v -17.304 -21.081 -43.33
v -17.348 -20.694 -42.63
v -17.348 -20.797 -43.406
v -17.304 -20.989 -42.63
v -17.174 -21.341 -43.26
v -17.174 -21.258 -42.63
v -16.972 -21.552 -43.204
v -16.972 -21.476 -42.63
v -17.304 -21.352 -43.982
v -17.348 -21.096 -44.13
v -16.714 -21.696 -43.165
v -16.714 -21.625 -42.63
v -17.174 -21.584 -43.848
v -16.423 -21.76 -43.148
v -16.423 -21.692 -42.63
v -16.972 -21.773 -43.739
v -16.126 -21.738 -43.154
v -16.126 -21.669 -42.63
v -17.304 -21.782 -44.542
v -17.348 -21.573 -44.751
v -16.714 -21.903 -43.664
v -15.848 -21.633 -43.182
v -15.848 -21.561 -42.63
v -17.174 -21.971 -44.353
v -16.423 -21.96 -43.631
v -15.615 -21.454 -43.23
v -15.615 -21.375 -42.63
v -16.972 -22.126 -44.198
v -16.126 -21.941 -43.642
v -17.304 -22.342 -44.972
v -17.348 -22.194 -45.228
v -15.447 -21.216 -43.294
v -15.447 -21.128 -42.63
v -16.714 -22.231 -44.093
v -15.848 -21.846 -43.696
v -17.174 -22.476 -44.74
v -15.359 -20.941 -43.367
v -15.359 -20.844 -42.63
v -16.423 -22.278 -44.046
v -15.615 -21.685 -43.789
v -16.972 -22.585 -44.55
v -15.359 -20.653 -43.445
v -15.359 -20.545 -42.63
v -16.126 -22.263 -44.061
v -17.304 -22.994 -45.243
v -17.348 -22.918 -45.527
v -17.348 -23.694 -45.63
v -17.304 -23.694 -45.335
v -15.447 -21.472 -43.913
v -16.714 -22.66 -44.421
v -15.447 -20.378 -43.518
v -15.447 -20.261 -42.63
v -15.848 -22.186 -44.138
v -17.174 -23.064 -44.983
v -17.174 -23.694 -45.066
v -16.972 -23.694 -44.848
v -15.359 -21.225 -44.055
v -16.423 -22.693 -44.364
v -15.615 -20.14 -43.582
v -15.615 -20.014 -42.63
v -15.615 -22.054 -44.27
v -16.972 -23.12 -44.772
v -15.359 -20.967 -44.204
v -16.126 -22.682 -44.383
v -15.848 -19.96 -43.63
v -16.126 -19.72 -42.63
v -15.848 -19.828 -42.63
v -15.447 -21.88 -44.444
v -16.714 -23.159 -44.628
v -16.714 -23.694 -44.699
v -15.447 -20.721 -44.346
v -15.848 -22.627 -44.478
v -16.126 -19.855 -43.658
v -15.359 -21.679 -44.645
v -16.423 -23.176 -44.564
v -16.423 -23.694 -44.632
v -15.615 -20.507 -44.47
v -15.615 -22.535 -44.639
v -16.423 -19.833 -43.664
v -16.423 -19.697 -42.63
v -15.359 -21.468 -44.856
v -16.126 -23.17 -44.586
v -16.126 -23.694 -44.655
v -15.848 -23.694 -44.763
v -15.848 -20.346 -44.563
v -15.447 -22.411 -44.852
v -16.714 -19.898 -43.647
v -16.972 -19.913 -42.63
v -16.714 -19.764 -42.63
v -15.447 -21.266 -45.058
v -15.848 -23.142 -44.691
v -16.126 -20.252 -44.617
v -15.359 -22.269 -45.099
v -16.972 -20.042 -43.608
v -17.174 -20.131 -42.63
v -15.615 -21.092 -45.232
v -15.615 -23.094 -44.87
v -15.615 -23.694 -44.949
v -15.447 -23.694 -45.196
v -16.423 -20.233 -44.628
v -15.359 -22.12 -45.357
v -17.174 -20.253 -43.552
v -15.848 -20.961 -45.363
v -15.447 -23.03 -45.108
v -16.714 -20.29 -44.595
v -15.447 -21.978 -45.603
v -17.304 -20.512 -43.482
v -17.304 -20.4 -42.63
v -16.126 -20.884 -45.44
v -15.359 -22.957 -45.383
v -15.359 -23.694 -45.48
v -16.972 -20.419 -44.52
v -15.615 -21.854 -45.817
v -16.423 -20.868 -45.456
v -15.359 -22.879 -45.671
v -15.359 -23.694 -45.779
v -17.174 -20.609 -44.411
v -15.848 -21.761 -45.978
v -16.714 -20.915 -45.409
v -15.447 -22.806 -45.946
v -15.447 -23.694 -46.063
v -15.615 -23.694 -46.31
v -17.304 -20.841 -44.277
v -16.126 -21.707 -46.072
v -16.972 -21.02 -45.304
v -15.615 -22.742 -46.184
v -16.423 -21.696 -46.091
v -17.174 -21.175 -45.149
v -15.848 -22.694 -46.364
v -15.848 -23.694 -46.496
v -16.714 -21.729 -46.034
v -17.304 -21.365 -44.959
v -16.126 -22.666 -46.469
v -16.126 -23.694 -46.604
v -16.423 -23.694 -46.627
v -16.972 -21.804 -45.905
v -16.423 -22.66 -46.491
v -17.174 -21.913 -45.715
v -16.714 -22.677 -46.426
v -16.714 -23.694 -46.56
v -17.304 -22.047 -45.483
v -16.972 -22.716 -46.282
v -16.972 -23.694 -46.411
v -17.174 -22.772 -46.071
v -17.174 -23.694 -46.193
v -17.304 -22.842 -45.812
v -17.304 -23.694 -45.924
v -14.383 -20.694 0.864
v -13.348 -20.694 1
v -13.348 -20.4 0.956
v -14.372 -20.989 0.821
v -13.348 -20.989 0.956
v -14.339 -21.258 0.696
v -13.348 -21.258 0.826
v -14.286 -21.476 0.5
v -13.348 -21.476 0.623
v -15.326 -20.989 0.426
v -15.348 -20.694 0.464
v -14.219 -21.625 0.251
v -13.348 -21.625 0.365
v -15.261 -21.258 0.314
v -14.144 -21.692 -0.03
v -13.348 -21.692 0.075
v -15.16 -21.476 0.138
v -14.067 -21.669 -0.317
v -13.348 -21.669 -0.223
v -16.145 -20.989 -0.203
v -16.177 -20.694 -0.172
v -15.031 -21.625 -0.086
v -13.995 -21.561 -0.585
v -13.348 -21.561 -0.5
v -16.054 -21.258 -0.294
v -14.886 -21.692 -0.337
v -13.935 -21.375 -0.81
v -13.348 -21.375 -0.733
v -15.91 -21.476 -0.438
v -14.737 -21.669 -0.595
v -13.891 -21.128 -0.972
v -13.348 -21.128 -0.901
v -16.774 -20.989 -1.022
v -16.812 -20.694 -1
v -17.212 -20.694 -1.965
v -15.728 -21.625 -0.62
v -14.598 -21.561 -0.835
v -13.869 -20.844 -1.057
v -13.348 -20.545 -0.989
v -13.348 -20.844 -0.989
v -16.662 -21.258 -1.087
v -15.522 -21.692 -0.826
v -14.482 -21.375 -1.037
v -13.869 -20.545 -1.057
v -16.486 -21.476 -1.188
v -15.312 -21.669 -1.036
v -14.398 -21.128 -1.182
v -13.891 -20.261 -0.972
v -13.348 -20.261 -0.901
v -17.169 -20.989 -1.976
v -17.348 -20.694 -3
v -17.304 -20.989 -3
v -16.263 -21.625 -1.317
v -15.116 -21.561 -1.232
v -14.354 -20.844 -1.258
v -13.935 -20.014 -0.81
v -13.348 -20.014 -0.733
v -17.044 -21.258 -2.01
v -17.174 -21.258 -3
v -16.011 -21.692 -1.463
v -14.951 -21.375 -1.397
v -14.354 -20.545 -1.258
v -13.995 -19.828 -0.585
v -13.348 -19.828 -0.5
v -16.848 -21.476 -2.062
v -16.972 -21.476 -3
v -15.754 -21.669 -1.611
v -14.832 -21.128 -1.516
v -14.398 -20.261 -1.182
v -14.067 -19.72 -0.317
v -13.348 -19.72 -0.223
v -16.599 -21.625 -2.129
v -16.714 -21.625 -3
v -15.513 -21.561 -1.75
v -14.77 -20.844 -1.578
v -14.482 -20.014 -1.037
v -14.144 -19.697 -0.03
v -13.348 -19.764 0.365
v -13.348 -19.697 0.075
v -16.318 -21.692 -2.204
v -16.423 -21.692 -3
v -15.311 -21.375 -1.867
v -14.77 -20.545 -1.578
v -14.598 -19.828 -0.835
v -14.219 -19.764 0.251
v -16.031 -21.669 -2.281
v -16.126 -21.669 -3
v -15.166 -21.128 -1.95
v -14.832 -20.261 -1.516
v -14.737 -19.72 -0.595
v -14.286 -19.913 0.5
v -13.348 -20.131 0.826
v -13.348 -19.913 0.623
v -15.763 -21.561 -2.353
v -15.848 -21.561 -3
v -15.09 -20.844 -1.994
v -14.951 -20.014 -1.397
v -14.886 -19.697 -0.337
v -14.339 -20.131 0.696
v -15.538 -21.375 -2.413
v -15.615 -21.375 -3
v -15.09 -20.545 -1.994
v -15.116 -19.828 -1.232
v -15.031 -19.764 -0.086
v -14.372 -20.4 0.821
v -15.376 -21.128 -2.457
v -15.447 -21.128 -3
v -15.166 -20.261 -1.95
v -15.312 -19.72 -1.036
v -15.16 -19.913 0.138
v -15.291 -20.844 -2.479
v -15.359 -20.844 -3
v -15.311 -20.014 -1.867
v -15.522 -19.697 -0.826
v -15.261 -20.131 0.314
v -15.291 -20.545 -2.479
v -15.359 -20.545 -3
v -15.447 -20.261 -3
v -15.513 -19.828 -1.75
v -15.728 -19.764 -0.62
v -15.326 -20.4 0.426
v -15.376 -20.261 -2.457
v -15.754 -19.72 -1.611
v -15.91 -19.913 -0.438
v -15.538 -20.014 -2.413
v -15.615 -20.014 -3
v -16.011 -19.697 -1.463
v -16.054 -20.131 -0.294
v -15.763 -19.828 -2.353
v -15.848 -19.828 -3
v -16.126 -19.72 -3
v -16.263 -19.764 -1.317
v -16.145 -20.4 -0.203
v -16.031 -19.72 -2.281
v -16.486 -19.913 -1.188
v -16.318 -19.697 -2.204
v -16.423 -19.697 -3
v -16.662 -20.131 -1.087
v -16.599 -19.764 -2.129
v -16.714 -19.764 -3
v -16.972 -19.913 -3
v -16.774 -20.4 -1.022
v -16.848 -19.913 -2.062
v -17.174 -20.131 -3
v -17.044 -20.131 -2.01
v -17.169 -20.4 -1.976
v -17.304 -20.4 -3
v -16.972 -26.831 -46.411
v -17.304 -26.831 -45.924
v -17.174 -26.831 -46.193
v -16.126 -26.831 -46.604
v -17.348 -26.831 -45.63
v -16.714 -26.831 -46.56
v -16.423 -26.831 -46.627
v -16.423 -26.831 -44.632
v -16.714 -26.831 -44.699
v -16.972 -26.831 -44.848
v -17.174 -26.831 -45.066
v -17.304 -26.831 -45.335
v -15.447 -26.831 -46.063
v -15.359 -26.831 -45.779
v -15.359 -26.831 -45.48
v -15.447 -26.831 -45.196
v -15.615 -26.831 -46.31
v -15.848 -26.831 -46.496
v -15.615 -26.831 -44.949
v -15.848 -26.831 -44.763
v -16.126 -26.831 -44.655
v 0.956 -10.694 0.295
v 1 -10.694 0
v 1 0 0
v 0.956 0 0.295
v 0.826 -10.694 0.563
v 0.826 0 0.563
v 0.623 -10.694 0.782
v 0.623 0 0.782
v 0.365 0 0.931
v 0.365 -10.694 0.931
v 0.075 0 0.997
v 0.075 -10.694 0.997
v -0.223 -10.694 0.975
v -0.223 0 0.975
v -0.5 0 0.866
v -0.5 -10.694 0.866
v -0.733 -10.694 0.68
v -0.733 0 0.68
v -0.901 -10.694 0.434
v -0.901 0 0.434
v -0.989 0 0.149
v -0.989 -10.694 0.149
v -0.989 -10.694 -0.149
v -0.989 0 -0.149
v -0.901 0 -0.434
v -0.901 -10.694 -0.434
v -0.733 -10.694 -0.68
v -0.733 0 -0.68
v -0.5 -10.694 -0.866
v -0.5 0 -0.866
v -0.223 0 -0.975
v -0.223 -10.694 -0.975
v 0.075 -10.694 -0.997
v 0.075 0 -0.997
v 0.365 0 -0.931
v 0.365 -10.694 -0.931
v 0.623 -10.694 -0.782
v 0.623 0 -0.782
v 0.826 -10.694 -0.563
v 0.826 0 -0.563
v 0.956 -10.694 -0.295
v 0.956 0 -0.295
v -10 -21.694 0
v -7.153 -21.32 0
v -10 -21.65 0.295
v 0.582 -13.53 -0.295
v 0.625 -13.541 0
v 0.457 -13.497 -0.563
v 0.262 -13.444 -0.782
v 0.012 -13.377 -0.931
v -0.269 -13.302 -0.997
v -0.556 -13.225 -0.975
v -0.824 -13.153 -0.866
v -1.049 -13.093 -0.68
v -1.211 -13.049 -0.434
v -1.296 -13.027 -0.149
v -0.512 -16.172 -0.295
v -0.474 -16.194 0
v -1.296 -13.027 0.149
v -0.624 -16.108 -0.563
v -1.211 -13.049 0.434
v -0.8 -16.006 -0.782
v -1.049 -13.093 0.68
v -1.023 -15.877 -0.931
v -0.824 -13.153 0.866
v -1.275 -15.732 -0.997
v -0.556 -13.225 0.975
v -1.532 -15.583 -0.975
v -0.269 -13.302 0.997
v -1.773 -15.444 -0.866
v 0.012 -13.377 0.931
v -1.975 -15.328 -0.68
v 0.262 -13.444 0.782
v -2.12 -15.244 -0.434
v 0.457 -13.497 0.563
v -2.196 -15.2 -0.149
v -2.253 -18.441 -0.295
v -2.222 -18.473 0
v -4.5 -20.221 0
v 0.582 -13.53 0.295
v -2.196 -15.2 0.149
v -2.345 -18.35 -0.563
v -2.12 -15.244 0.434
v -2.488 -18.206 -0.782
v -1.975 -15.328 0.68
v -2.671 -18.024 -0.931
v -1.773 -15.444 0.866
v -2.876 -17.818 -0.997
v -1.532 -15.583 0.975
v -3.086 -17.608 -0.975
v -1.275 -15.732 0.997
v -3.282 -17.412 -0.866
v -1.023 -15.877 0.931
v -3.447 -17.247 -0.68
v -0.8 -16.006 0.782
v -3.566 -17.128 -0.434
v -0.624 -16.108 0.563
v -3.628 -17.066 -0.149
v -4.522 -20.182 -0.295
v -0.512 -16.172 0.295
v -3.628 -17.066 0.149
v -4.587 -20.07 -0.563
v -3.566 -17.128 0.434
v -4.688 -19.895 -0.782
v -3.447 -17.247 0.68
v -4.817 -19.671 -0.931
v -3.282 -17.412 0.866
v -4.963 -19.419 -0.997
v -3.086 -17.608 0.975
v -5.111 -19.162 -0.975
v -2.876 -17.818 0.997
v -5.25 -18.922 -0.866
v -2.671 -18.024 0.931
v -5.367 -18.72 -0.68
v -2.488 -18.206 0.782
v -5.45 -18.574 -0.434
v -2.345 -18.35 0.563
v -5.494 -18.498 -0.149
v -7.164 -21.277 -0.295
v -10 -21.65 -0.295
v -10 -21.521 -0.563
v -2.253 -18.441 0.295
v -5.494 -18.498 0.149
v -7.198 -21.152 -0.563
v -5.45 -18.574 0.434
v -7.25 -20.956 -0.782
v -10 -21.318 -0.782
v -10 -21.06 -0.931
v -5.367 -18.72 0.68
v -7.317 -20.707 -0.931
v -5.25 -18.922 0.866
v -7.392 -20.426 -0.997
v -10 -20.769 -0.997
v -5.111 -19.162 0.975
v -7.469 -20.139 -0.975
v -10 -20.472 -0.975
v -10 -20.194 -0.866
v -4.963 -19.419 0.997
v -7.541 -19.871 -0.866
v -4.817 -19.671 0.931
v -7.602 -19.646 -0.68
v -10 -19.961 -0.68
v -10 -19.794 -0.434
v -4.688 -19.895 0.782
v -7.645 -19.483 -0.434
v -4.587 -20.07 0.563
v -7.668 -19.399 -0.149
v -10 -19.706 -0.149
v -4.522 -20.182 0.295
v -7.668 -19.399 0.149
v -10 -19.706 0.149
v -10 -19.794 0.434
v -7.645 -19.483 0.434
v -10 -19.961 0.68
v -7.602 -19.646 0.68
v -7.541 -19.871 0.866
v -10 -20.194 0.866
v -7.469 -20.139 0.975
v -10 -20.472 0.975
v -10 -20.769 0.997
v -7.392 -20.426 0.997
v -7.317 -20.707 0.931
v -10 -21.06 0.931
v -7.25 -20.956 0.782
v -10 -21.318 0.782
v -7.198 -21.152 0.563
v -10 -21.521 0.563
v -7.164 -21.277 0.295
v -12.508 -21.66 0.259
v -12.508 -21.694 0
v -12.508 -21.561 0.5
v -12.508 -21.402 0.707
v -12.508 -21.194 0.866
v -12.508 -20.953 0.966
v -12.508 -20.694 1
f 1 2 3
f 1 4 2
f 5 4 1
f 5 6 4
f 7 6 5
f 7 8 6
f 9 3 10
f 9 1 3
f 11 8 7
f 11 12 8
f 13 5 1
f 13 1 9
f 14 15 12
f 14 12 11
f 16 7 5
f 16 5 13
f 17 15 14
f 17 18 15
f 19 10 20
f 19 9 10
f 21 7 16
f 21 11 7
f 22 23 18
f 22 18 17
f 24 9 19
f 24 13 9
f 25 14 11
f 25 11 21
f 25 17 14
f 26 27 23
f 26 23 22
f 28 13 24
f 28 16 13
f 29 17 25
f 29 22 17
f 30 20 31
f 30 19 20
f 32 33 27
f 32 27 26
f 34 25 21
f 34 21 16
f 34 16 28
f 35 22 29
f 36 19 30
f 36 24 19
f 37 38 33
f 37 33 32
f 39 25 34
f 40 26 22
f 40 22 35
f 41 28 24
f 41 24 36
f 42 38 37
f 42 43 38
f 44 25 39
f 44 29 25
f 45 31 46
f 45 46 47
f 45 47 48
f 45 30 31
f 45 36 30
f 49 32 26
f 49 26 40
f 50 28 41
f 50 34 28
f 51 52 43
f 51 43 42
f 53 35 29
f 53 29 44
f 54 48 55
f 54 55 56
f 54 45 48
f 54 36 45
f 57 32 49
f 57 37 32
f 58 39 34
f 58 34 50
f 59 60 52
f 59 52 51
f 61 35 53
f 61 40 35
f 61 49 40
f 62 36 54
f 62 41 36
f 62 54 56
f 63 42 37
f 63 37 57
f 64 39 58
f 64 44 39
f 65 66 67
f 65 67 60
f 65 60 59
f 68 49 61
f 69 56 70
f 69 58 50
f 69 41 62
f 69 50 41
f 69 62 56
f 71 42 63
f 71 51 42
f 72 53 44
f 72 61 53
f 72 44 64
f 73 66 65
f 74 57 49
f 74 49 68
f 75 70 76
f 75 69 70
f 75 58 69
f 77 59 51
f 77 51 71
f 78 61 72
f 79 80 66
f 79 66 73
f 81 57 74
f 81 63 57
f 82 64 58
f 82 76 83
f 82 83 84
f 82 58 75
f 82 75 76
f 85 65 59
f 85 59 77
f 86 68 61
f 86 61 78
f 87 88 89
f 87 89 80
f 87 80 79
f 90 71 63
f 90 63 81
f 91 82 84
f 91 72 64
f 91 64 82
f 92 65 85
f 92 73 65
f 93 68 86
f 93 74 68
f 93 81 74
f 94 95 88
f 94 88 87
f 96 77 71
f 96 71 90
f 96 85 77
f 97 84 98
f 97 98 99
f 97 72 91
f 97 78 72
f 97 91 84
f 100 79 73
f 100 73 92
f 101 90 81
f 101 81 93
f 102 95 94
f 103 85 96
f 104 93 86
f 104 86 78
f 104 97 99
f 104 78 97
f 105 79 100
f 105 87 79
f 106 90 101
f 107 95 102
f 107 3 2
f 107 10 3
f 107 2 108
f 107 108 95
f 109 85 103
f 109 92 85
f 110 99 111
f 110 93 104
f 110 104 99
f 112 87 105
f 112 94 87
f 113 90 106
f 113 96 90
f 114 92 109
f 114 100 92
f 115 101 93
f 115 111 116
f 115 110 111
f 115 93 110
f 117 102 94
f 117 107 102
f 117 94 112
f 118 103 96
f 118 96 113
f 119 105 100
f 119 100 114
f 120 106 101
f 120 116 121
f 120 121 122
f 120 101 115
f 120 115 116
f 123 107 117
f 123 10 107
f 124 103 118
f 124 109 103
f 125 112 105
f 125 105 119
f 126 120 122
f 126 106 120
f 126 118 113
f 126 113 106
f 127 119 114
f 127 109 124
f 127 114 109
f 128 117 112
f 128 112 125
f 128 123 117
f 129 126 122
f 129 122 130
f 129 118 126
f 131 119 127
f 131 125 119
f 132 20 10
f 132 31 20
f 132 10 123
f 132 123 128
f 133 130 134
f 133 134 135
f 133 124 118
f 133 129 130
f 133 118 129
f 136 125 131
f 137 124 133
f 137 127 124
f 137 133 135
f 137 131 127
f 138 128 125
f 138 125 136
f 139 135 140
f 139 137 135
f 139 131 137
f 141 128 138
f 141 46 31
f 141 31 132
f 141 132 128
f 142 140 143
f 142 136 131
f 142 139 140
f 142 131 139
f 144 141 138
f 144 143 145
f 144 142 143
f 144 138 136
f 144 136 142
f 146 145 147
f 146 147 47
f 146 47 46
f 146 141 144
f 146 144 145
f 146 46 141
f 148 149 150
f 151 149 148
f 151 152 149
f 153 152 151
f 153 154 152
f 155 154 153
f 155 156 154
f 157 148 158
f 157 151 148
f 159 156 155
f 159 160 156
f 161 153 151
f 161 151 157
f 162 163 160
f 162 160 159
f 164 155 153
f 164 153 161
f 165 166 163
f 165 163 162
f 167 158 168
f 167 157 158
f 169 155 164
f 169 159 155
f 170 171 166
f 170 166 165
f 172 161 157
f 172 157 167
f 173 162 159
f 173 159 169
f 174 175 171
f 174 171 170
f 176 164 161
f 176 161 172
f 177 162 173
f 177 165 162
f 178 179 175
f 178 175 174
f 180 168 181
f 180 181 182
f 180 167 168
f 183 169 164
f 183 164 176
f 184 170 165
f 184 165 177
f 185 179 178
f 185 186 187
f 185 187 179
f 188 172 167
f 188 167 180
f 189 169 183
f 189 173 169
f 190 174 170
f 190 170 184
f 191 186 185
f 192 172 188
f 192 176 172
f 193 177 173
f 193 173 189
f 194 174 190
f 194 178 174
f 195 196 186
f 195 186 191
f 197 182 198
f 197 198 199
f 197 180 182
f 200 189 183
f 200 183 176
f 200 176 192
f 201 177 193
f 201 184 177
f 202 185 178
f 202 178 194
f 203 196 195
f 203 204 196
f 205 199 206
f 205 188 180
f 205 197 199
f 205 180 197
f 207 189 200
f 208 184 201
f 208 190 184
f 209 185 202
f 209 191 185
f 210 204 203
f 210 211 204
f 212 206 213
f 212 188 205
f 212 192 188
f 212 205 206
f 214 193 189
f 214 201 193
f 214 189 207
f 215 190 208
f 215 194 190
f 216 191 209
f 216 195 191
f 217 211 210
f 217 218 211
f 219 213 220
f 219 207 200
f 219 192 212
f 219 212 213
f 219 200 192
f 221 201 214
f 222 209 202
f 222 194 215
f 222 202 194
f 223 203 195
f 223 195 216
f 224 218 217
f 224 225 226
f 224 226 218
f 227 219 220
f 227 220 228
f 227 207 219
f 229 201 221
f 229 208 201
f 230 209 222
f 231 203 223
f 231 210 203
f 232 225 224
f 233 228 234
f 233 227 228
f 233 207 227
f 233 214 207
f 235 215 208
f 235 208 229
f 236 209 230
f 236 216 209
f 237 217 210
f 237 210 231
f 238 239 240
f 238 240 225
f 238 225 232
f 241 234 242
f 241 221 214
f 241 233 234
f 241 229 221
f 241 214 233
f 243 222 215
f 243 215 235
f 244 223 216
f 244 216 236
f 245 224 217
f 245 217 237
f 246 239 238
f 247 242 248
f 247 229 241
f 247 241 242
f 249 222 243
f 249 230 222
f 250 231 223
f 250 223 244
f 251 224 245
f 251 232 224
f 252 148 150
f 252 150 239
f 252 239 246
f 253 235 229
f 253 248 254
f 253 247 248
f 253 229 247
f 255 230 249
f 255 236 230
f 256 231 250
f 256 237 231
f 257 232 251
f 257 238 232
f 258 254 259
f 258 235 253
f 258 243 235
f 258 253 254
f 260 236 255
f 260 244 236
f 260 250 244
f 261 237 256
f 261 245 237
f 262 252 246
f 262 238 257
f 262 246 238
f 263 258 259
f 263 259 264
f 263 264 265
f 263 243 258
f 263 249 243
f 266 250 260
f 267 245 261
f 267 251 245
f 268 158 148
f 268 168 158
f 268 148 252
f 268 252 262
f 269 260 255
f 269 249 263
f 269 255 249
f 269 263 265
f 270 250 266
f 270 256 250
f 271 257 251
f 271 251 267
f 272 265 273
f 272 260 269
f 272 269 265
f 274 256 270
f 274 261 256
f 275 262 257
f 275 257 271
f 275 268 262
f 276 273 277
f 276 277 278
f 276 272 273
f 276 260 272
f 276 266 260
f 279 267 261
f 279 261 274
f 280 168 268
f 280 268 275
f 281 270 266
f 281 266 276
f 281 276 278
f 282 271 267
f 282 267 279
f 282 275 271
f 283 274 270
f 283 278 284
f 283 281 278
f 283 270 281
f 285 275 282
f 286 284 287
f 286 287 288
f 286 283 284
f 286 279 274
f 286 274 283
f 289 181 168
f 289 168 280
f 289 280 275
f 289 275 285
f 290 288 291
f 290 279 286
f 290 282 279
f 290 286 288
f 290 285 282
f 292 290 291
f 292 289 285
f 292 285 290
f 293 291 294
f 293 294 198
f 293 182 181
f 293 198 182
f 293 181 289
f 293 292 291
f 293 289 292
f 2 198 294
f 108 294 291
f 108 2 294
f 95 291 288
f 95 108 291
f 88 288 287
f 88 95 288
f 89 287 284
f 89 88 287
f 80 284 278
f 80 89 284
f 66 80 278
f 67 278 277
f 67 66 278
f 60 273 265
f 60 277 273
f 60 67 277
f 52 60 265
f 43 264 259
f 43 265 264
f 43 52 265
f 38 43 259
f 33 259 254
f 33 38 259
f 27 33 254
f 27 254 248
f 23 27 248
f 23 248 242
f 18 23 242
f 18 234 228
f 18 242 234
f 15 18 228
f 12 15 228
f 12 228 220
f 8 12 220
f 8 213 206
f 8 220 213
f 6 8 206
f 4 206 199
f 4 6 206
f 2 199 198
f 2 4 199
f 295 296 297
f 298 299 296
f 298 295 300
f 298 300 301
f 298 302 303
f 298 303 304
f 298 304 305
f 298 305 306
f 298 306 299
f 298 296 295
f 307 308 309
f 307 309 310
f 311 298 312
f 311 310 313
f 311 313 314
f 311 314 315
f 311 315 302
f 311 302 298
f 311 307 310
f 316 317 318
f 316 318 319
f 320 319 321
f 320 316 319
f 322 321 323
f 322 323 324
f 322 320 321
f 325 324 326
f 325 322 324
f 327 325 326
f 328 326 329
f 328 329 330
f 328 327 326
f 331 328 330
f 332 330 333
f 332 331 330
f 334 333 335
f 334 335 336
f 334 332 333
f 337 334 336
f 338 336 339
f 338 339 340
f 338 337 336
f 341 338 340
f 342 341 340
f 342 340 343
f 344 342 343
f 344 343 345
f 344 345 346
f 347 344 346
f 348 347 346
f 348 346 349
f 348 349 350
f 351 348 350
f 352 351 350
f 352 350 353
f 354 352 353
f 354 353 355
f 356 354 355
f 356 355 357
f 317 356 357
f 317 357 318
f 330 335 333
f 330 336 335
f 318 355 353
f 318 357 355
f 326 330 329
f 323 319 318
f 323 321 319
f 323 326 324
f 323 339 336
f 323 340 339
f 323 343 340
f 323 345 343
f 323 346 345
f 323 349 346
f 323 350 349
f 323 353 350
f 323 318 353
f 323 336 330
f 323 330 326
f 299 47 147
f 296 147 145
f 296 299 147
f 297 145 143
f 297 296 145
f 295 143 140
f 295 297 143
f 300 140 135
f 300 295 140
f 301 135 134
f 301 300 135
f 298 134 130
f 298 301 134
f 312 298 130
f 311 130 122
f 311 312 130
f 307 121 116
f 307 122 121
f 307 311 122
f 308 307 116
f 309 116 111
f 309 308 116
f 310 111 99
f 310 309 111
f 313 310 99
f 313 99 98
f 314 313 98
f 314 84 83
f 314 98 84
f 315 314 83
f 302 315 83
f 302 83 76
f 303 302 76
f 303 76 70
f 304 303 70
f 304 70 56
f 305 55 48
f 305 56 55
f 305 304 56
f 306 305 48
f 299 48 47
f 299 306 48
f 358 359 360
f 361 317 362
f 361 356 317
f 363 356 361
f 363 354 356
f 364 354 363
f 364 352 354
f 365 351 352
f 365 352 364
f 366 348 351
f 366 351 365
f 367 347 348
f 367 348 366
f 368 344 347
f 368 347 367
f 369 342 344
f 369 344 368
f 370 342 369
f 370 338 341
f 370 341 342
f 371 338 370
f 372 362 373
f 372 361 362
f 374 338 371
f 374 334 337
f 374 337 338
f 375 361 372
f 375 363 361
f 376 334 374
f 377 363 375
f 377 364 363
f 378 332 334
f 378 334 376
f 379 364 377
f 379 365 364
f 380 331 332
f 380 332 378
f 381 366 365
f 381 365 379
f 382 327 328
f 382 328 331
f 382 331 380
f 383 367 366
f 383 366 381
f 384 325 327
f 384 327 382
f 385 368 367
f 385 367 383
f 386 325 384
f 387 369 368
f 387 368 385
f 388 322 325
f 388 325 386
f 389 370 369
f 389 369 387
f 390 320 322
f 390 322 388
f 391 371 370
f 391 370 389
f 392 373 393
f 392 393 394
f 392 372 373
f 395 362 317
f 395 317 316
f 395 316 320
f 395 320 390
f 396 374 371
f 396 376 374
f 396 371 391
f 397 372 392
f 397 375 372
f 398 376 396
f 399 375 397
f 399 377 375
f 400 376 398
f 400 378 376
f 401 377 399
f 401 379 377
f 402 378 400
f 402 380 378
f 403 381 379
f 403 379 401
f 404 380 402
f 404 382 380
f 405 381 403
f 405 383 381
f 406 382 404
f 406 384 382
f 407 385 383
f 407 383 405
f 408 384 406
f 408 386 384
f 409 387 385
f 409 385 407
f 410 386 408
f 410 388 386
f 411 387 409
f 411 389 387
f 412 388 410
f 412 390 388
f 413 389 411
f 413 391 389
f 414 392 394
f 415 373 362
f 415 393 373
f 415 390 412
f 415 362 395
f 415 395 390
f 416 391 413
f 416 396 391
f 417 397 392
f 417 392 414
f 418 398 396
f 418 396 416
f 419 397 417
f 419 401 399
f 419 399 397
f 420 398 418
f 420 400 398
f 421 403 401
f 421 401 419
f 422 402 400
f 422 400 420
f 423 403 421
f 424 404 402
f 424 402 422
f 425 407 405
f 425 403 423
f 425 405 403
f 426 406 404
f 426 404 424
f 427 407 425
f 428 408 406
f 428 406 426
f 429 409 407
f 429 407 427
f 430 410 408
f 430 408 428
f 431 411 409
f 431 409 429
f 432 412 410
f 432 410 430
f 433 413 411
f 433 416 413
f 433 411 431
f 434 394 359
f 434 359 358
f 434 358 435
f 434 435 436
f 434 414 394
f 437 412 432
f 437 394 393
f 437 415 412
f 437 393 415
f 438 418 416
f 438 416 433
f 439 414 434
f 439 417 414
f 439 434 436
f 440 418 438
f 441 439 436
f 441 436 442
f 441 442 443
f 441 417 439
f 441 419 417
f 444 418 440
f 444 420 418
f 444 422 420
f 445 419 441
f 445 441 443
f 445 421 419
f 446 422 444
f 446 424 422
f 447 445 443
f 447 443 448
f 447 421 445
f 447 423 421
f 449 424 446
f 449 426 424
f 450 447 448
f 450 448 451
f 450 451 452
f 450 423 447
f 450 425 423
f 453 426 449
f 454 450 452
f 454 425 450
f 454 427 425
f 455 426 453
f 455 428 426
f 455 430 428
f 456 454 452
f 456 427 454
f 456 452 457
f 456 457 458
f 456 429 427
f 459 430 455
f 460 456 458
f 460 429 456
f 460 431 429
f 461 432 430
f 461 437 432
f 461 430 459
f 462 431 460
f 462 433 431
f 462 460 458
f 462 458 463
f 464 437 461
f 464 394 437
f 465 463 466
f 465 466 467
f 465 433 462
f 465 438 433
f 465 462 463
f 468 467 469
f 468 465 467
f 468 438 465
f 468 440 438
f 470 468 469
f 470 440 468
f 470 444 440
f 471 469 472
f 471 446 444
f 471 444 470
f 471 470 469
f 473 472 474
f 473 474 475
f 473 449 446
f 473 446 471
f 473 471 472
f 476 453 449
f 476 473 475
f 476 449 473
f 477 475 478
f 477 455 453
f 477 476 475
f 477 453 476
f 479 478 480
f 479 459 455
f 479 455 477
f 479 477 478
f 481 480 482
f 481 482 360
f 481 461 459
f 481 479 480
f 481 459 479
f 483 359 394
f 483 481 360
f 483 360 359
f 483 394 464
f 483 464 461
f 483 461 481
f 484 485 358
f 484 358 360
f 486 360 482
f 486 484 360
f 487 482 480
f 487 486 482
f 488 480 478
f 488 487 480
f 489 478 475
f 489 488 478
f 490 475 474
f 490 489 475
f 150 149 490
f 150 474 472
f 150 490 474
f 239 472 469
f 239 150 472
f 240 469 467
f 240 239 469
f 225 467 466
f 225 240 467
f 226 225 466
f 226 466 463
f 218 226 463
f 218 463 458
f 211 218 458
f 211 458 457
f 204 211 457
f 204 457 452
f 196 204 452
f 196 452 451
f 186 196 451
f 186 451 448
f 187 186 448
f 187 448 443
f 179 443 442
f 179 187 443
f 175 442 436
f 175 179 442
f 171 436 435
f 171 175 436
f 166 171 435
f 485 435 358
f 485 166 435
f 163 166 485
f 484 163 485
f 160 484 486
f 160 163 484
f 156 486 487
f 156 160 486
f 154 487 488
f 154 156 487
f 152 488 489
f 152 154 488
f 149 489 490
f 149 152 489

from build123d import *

# Parameters (mm, degrees)
SKETCH3_R = 1
SKETCH4_R = 1
SKETCH6_R = 1


with BuildPart() as part:
    # Sweep1: sweep along a path in Sketch1
    with BuildLine(Plane.XY) as sweep1_path:
        Line((0, 0), (0, -10.694484018))
        ThreePointArc((0, -10.694484018), (-2.928932188, -17.76555183), (-10, -20.694484018))
        Line((-10, -20.694484018), (-12.508437971, -20.694484018))
    # Sketch3 → Sweep1 (sweep)
    with BuildSketch(Plane(origin=(0, 0, 0), x_dir=(1, 0, 0), z_dir=(0, 1, 0))):
        Circle(SKETCH3_R)
    sweep(path=sweep1_path.line)

    # Sweep2: sweep along a path in Sketch2
    with BuildLine(Plane(origin=(0, -20.694484018, 0), x_dir=(1, 0, 0), z_dir=(0, 1, 0))) as sweep2_path:
        Line((-12.508437971, 0), (-13.348220683, 0))
        ThreePointArc((-13.348220683, 0), (-15.469541026, 0.878679656), (-16.348220683, 3))
        Line((-16.348220683, 3), (-16.348220683, 39.916632526))
    # Sketch4 → Sweep2 (sweep)
    with BuildSketch(Plane.ZY.offset(12.508437971)):
        with Locations((0, -20.694484018)):
            Circle(SKETCH4_R)
    sweep(path=sweep2_path.line)

    # Sweep3: sweep along a path in Sketch5
    with BuildLine(Plane(origin=(-16.348220683, 0, 0), x_dir=(0, 0, -1), z_dir=(1, 0, 0))) as sweep3_path:
        Line((39.916632526, -20.694484018), (42.629508897, -20.694484018))
        ThreePointArc((42.629508897, -20.694484018), (44.750829241, -21.573163675), (45.629508897, -23.694484018))
        Line((45.629508897, -23.694484018), (45.629508897, -26.831314156))
    # Sketch6 → Sweep3 (sweep)
    with BuildSketch(Plane(origin=(0, 0, -39.916632526), x_dir=(-1, 0, 0), z_dir=(0, 0, -1))):
        with Locations((16.348220683, -20.694484018)):
            Circle(SKETCH6_R)
    sweep(path=sweep3_path.line)


solid = part.part
